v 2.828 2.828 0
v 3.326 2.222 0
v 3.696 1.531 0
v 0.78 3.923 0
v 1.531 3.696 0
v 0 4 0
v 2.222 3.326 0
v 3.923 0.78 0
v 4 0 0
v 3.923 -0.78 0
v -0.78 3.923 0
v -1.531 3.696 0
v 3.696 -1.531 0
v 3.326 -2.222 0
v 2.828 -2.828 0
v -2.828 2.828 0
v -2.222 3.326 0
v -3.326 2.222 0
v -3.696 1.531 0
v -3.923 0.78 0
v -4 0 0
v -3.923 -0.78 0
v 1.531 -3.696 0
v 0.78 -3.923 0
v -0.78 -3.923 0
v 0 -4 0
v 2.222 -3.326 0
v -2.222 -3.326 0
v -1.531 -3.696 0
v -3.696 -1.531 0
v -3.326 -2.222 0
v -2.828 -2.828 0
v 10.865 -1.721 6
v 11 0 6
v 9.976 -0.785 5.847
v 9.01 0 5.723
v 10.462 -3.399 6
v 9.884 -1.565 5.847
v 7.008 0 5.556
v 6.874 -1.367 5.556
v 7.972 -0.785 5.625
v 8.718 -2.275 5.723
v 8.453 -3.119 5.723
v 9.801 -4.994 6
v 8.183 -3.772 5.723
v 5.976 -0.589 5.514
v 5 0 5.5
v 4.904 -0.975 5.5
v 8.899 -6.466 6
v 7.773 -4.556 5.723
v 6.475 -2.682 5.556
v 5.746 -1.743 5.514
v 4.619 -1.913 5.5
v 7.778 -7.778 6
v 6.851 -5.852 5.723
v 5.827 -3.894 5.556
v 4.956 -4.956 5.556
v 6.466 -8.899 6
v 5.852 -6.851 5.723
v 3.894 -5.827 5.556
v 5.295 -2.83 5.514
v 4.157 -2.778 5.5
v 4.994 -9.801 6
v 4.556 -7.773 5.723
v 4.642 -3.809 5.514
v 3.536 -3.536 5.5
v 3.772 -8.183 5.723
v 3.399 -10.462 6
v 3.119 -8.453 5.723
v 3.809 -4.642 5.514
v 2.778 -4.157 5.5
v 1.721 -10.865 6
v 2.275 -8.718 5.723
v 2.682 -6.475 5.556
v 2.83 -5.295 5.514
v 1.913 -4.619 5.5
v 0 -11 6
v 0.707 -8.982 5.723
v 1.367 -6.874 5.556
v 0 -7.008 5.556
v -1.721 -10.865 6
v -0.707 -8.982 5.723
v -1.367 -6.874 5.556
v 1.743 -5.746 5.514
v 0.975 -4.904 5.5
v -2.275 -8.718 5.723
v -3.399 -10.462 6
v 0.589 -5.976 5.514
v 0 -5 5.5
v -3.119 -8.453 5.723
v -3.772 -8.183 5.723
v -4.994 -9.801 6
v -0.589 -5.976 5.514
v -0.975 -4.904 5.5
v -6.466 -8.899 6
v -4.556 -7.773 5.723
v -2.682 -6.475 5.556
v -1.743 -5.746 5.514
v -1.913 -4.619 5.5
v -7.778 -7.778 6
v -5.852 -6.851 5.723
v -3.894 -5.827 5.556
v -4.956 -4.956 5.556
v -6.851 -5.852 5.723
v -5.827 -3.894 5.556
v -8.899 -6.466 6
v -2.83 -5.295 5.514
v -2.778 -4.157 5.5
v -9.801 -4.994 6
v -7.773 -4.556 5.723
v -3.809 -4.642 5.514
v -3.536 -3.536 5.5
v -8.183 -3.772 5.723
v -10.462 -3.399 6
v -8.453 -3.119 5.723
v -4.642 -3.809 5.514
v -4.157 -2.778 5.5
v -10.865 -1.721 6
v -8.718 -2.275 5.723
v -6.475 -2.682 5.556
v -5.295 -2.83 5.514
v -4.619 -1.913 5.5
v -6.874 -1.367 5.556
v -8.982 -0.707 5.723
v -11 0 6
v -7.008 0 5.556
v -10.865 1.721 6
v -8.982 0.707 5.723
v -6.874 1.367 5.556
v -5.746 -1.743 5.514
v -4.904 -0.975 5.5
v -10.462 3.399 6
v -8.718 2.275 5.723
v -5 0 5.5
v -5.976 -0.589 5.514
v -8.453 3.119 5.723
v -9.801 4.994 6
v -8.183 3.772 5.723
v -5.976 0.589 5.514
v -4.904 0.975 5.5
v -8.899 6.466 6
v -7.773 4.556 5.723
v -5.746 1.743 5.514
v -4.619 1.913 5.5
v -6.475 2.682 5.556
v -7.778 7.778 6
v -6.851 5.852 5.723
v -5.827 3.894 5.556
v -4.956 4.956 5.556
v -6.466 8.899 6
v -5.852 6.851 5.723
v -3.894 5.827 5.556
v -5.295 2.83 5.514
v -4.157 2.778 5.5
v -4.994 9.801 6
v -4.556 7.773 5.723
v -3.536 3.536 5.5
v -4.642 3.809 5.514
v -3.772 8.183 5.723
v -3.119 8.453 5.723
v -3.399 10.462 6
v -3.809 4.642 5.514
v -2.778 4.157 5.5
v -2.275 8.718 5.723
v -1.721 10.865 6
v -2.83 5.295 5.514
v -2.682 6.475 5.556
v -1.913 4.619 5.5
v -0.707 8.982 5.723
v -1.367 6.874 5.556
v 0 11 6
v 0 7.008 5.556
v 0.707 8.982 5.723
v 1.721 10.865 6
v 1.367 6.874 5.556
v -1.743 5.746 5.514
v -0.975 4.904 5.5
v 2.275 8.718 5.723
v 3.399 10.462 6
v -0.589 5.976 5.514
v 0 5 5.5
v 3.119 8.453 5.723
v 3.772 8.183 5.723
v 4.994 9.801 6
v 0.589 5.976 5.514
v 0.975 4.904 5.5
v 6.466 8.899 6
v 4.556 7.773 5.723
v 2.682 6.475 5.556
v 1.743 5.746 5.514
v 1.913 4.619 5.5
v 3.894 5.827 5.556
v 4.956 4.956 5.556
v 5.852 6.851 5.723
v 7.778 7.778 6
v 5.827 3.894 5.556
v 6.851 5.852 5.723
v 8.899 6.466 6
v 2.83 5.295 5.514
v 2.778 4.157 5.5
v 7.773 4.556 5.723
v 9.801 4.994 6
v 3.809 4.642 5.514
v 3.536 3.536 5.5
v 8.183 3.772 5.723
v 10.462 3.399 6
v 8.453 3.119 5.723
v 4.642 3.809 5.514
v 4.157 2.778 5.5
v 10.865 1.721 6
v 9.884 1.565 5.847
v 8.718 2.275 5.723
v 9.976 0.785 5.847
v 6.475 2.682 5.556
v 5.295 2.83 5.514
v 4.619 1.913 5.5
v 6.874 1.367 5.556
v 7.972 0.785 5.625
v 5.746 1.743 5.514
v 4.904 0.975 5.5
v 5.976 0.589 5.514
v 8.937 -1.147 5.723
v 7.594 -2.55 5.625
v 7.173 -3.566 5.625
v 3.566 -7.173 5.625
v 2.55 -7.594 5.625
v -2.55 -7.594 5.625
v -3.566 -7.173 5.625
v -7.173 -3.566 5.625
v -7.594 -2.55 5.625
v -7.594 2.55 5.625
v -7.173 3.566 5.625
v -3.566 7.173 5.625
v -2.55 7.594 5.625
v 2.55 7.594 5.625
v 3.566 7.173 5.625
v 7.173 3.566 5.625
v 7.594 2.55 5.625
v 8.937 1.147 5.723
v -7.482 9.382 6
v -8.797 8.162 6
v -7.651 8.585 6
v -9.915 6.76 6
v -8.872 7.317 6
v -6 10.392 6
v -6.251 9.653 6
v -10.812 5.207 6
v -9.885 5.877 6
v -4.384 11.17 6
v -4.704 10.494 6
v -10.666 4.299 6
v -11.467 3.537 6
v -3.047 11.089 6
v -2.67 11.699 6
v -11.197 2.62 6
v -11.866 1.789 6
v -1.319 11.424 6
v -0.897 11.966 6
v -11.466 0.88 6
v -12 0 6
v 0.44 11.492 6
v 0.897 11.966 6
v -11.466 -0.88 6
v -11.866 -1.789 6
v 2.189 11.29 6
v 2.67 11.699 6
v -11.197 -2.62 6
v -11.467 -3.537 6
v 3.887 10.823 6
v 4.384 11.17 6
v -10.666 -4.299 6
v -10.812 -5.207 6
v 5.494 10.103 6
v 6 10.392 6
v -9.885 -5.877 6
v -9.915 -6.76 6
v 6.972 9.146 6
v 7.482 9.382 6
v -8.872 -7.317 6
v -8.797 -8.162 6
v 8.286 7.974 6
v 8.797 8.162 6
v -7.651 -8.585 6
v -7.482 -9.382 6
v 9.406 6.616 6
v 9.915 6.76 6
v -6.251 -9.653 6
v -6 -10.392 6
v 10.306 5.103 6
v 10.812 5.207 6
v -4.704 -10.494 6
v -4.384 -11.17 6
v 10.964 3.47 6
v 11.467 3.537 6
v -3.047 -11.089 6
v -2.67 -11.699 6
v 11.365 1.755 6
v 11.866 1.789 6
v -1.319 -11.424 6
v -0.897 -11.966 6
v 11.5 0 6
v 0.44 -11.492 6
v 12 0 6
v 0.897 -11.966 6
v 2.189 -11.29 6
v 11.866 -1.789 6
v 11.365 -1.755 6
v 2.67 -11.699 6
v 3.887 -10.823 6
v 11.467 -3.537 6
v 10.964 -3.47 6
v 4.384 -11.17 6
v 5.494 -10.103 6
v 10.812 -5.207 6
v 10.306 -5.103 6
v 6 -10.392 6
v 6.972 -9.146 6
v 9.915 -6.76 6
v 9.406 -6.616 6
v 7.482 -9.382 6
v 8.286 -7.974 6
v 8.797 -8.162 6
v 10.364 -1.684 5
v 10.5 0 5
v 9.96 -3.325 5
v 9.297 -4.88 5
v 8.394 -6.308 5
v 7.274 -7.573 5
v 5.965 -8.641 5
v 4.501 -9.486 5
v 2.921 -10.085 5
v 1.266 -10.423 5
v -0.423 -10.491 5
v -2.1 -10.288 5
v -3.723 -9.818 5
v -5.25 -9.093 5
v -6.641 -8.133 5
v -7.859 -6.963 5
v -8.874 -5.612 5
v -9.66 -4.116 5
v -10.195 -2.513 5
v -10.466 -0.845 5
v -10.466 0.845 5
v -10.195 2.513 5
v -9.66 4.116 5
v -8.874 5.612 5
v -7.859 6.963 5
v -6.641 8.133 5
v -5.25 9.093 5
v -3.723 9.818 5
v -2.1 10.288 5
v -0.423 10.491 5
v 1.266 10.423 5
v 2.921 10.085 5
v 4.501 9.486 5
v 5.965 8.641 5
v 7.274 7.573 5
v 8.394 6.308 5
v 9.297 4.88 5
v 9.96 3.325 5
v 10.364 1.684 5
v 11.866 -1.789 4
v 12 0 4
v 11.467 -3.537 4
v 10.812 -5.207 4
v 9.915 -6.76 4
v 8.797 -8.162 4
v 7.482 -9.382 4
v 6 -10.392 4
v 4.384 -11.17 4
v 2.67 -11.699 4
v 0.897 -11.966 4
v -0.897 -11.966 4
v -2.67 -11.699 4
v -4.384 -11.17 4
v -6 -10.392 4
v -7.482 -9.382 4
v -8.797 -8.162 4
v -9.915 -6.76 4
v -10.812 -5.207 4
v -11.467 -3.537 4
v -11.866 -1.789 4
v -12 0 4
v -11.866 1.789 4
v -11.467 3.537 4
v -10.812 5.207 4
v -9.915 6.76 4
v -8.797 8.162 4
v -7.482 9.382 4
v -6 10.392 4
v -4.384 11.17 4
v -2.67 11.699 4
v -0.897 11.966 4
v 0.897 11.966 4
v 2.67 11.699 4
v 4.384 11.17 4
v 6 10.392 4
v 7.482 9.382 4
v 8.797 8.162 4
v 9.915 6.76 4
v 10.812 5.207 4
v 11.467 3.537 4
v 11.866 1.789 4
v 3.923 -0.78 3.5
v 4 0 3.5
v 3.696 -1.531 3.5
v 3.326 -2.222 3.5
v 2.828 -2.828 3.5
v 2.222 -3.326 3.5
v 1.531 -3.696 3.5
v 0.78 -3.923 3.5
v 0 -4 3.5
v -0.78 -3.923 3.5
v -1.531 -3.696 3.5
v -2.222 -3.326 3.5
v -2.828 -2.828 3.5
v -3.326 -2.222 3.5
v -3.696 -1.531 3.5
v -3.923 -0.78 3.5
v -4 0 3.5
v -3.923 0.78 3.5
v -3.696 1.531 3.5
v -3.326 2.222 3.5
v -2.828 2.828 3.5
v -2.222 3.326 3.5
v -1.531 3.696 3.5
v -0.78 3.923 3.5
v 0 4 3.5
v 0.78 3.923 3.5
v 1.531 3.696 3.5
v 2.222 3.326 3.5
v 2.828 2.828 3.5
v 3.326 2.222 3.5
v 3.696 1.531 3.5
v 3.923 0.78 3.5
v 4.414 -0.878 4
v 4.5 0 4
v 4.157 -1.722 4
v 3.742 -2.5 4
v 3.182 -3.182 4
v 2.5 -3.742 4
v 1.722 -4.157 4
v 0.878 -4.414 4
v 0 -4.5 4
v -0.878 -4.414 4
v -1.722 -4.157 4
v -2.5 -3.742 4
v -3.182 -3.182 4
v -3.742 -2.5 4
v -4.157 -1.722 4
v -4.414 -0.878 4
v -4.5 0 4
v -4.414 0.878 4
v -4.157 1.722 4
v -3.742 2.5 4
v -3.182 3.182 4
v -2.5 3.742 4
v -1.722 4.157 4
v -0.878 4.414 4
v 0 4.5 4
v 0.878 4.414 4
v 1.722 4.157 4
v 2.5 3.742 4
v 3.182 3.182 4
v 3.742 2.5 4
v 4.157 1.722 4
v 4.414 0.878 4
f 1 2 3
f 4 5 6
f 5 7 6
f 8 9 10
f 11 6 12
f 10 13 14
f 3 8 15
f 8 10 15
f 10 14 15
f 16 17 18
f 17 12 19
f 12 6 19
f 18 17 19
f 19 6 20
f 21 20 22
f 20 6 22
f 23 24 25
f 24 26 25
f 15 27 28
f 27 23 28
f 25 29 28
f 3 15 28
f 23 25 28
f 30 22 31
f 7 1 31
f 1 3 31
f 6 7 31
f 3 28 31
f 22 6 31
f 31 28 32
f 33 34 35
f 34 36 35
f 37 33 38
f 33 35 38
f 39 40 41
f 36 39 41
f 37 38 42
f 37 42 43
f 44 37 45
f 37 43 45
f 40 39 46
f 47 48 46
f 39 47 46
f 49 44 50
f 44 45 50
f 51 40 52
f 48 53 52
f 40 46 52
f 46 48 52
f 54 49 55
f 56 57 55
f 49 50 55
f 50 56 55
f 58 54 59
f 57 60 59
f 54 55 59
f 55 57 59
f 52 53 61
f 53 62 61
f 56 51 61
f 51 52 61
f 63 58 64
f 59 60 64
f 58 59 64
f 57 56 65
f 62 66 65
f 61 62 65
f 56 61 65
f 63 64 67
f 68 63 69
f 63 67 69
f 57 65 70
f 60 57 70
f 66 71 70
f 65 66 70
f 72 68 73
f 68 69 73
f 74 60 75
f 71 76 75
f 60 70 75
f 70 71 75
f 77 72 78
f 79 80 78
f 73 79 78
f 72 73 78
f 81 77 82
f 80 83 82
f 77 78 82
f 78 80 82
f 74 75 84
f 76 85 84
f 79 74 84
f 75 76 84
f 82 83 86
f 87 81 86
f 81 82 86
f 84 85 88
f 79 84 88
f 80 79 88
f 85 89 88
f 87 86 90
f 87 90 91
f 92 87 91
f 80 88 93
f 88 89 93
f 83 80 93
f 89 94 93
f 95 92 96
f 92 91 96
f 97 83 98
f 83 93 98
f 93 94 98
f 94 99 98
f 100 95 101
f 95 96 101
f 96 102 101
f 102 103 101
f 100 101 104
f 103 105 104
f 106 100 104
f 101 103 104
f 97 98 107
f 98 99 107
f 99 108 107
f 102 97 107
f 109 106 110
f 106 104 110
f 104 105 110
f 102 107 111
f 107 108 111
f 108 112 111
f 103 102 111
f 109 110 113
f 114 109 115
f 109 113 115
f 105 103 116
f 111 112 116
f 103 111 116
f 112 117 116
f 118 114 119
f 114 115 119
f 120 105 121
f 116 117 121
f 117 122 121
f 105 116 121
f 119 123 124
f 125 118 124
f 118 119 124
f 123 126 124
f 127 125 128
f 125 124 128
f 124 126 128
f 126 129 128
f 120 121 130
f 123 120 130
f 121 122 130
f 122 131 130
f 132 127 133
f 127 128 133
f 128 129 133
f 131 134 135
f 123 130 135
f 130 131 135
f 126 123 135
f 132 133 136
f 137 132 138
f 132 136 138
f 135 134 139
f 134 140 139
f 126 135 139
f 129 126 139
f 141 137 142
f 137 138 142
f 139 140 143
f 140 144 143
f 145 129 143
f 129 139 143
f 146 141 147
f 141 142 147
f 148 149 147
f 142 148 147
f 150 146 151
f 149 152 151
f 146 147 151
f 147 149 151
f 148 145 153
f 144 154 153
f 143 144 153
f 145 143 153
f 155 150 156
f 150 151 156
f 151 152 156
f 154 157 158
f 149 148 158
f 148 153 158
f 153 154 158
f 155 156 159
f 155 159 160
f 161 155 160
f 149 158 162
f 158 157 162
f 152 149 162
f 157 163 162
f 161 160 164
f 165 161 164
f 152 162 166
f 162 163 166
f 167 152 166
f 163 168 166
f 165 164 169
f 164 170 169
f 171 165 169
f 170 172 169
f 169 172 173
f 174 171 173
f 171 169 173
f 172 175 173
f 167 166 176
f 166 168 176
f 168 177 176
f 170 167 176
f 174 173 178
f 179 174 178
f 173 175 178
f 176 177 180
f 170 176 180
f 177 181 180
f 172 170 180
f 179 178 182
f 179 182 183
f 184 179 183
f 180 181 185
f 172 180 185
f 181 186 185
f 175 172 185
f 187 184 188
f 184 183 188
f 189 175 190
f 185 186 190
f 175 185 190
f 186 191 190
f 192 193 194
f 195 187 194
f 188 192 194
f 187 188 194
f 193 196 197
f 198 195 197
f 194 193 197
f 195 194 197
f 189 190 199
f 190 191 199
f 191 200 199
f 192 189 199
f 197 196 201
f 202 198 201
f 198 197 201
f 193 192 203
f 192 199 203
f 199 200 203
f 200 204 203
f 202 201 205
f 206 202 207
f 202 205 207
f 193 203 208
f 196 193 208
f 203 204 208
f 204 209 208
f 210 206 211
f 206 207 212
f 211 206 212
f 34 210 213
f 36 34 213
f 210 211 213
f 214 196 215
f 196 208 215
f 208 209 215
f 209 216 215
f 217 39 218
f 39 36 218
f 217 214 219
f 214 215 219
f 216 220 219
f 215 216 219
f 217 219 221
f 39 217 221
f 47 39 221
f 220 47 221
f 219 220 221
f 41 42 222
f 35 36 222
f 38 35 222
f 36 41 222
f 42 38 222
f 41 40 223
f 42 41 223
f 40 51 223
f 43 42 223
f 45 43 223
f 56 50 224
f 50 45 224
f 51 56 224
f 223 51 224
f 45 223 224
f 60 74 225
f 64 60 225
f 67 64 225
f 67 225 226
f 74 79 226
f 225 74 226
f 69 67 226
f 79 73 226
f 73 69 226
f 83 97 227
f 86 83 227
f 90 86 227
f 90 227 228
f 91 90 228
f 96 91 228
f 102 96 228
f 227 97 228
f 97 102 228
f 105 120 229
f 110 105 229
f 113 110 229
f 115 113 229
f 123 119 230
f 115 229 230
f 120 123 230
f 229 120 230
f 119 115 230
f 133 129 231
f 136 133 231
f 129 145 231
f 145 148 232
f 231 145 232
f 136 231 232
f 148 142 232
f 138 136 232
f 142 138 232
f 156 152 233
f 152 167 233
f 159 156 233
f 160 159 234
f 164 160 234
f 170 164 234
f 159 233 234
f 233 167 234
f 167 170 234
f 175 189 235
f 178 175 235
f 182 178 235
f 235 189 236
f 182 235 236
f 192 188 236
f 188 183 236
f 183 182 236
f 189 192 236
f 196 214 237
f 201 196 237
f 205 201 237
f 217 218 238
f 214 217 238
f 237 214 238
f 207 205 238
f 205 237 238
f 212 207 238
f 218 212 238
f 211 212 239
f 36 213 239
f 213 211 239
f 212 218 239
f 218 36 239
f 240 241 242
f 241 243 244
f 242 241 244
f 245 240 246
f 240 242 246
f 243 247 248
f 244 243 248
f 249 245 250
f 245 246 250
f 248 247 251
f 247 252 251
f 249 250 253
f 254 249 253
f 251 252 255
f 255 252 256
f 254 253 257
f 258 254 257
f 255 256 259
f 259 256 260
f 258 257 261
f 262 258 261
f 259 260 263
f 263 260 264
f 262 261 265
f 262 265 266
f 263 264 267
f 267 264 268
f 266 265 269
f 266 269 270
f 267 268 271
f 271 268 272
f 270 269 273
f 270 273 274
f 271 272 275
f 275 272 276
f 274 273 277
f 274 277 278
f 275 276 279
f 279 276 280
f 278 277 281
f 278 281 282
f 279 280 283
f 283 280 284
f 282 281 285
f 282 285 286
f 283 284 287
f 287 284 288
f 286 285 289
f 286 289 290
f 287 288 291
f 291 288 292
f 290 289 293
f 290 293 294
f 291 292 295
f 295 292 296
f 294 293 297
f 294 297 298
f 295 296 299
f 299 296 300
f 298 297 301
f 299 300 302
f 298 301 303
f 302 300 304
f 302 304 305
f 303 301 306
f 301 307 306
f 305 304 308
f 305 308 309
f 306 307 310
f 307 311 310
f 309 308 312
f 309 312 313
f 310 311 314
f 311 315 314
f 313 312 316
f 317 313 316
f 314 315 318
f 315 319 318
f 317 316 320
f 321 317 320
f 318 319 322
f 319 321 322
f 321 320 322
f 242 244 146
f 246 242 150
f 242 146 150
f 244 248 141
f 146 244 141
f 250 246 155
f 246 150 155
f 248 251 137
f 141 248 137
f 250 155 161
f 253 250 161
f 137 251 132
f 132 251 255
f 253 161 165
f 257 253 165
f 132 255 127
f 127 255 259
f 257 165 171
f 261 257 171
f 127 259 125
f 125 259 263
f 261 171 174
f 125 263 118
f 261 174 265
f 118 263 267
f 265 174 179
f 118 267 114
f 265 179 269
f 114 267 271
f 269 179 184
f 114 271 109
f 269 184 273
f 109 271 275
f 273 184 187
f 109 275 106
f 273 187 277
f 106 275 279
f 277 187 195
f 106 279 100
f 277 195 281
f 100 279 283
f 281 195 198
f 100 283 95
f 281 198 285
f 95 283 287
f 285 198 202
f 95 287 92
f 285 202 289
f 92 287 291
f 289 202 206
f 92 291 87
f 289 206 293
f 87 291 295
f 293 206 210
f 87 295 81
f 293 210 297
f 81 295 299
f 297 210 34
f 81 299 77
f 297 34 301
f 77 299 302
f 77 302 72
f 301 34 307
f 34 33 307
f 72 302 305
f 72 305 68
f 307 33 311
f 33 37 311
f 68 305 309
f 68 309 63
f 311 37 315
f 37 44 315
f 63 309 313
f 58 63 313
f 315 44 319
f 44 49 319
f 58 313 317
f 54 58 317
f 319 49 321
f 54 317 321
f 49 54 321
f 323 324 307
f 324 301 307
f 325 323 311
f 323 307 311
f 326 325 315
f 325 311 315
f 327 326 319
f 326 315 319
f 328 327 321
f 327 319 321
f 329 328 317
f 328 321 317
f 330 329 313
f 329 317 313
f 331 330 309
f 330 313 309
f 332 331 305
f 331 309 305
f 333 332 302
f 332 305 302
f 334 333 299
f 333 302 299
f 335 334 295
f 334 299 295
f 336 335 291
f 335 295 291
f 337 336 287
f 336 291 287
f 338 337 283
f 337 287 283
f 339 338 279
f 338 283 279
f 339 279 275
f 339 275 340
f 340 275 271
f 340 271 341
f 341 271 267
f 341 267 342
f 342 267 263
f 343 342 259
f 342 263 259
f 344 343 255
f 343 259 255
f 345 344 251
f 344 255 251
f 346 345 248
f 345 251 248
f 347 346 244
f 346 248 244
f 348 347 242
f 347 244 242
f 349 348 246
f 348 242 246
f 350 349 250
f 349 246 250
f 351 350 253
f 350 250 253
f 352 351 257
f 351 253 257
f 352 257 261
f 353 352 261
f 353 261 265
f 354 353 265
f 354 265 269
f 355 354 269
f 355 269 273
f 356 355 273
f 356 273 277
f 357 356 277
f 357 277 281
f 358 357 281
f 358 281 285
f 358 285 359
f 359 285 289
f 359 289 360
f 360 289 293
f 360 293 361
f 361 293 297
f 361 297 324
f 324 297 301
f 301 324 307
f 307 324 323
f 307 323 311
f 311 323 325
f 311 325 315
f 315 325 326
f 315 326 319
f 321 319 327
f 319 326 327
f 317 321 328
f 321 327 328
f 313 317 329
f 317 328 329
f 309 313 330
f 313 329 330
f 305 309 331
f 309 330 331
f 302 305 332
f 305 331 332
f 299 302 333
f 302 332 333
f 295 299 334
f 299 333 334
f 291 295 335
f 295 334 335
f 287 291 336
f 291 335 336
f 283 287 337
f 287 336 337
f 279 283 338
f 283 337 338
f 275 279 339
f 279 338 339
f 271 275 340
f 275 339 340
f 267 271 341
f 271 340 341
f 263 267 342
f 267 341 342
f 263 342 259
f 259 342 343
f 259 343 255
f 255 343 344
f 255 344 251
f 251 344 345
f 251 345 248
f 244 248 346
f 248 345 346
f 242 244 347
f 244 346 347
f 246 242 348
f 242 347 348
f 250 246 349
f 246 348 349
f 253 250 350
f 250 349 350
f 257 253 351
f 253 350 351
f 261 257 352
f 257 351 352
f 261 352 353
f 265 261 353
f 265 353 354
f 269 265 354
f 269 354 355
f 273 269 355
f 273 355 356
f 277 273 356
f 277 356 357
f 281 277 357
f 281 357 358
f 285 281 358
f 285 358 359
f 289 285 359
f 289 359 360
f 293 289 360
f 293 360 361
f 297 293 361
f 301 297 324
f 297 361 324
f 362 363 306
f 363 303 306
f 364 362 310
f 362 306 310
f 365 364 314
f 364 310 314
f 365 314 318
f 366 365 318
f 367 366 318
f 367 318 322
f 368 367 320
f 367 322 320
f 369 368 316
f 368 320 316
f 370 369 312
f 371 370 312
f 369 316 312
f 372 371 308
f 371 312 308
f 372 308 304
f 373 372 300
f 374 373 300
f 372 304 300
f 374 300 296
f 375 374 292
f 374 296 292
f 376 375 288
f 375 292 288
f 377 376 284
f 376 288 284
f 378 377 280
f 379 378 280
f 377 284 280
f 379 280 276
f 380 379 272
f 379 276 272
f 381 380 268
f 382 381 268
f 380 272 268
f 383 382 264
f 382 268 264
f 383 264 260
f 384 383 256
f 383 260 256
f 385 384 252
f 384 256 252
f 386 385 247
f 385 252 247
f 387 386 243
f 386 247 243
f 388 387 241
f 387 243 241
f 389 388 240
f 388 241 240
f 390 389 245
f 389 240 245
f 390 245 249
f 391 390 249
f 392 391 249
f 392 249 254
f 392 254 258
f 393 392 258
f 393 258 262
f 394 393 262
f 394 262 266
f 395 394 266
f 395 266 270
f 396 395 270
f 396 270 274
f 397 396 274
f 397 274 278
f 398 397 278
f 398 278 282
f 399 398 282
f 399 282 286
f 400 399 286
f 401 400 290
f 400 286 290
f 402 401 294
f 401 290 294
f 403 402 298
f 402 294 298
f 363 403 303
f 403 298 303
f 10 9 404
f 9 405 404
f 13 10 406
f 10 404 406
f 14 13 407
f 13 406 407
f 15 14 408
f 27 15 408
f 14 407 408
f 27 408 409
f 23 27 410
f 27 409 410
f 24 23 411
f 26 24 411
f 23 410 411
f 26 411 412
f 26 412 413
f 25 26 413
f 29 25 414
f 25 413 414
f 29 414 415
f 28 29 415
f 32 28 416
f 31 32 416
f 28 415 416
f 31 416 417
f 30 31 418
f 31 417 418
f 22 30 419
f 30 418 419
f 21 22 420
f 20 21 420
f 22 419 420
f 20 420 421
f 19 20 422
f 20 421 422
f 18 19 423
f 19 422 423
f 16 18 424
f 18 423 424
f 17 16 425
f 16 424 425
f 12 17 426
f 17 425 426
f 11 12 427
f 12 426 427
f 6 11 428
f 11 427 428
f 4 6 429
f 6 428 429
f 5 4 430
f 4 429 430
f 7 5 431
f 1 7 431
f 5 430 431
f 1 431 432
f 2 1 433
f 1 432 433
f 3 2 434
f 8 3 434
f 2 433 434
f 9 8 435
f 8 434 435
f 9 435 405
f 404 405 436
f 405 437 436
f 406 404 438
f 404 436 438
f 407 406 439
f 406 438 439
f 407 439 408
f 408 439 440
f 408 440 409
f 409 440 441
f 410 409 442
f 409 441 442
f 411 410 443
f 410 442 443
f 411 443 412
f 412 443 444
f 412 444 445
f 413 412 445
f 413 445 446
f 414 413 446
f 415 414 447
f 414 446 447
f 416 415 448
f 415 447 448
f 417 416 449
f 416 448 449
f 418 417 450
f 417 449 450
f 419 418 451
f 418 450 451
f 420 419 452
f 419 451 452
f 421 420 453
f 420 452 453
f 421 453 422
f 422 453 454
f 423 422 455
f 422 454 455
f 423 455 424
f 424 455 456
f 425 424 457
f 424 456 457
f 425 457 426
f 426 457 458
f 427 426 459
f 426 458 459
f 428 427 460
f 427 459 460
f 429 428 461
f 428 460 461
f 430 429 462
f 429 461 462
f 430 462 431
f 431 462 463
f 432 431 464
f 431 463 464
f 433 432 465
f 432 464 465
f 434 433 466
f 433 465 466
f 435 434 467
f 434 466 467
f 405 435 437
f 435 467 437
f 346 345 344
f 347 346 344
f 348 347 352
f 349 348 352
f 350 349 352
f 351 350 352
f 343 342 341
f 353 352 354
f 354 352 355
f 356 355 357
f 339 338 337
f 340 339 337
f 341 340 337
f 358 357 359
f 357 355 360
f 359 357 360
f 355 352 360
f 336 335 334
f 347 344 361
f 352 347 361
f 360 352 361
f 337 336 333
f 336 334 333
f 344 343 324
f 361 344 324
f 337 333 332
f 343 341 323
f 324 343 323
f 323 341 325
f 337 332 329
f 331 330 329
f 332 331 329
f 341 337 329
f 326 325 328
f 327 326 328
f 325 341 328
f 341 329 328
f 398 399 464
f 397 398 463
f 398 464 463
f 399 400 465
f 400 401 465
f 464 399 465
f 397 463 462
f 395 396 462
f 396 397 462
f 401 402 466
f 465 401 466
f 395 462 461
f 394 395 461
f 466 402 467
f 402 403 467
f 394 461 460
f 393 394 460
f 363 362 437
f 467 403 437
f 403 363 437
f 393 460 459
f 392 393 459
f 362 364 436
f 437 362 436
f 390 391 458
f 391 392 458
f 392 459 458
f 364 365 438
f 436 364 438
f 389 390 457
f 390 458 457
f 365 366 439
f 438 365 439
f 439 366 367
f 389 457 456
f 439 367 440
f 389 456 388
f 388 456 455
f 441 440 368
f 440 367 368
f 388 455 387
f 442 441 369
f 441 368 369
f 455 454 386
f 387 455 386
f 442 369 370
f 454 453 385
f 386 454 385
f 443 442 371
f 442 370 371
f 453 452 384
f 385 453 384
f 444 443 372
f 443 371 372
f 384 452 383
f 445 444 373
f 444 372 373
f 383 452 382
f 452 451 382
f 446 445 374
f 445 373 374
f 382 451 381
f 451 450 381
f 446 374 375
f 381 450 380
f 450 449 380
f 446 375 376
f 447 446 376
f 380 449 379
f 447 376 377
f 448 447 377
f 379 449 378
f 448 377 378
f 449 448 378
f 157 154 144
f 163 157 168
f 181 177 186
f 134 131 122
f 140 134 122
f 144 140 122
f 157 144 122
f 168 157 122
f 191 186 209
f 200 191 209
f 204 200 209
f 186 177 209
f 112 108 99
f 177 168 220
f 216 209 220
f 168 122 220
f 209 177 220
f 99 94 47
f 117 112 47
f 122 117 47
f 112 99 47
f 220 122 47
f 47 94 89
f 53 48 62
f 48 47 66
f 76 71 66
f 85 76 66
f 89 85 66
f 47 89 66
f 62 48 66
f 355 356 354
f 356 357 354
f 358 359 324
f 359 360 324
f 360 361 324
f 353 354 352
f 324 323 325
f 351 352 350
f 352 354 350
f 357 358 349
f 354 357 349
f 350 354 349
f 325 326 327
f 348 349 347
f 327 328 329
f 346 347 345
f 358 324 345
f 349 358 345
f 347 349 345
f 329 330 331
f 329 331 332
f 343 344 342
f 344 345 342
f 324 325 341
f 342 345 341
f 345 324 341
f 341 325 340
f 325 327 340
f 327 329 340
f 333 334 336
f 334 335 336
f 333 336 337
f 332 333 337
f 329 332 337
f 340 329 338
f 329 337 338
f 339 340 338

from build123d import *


# Not quite as in the source:
# - a feature of the source that left no trace in its solid (it failed there, or was rolled back) is left out
# - a feature names something its author has since deleted; it is built from what else it names


with BuildPart() as f1:
    # F0 (on Front) → F1 (revolve)
    with BuildSketch(Plane.XZ):
        Polygon((0, 5), (0, 0), (4, 0), (4, 3.5), (4.5, 4), (12, 4), (12, 6), (11.5, 6), (10.5, 5), align=None)
    revolve(axis=Axis((0, 0, 2.5), (0, 0, -1)))


with BuildPart() as f2:
    # F0 (on Front) → F2 (revolve)
    with BuildSketch(Plane.XZ):
        with BuildLine():
            Line((0, 5.5), (0, 5))
            Line((0, 5), (10.5, 5))
            Line((10.5, 5), (11.5, 6))
            Line((11.5, 6), (11, 6))
            ThreePointArc((11, 6), (8.0103986447, 5.6252162636), (5, 5.5))
            Line((5, 5.5), (0, 5.5))
        make_face()
    revolve(axis=Axis((0, 0, 2.5), (0, 0, -1)))


solid = Compound([f1.part, f2.part])
